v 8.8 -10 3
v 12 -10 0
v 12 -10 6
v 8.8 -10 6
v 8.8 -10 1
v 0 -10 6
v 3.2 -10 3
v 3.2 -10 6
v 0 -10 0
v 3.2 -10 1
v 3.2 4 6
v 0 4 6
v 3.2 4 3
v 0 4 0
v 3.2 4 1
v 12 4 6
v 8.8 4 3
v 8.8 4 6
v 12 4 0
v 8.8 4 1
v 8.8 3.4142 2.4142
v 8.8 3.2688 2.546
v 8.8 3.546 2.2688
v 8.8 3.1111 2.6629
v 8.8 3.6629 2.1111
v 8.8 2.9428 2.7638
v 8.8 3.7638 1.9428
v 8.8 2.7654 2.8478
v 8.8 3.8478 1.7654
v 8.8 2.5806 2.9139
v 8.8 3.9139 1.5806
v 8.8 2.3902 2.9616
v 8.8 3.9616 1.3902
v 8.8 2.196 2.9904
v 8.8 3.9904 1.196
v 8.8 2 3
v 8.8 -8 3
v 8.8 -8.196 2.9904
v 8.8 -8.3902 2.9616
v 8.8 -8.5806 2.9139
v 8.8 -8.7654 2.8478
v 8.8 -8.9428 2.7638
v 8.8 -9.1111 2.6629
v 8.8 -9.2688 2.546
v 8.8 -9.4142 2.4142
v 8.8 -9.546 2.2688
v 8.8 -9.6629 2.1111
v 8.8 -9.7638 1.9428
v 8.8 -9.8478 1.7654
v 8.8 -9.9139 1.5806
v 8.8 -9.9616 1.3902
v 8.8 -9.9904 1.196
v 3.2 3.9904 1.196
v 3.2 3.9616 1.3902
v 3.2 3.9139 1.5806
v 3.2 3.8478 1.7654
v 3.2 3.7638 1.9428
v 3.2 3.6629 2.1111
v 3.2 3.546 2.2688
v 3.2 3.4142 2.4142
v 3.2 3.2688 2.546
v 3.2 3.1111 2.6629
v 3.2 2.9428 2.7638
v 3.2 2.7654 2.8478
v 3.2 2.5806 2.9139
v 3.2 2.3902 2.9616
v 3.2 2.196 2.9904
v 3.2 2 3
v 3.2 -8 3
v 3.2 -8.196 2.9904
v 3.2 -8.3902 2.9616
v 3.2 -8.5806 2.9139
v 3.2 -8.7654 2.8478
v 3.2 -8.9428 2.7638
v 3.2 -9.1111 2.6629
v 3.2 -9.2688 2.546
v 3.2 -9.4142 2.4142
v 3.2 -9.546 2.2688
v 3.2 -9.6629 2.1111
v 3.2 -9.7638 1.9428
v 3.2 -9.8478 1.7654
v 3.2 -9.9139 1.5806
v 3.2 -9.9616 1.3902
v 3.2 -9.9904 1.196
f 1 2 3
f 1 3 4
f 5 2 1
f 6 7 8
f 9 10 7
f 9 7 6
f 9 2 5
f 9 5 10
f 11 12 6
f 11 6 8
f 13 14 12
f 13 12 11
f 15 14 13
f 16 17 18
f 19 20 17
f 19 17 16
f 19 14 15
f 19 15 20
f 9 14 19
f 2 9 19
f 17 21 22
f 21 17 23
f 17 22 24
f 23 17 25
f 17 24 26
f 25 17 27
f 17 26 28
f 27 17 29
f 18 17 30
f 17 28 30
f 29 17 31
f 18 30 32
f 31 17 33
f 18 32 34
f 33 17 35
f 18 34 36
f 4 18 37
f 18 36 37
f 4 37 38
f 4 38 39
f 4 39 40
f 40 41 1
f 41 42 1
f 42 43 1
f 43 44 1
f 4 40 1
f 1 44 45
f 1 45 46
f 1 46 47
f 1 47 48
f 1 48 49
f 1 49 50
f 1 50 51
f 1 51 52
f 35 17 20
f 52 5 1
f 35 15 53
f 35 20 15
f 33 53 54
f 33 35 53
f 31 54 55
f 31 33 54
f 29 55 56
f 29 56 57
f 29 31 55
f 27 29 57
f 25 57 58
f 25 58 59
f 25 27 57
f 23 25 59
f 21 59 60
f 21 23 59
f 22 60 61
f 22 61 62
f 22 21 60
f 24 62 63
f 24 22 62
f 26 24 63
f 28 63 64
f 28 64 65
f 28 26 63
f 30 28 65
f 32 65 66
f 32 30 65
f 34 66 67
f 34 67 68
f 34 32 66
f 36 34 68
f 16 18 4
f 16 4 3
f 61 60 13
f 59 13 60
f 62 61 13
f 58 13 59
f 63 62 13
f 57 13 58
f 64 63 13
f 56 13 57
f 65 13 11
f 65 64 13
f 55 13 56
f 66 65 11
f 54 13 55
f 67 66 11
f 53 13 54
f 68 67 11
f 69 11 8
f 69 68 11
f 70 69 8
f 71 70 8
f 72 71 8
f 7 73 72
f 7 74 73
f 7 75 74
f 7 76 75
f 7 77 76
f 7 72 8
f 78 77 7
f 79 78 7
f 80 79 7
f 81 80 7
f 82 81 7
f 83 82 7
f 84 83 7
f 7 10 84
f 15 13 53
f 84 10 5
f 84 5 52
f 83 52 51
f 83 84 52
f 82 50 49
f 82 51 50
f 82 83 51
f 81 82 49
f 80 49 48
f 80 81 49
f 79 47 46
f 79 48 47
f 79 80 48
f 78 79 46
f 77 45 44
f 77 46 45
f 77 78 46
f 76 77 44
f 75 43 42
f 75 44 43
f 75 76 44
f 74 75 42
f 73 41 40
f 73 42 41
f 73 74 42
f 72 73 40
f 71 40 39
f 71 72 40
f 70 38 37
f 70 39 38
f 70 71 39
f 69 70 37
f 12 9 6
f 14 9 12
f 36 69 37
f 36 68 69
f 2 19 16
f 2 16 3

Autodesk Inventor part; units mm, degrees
ref_plane "YZ Plane" through (0, 0, 0) normal (1, 0, 0) x (0, 1, 0)
ref_plane "XZ Plane" through (0, 0, 0) normal (0, 1, 0) x (-1, 0, 0)
ref_plane "XY Plane" through (0, 0, 0) normal (0, 0, 1) x (1, 0, 0)
ref_plane "Work Plane1" through (0, 0, 0) normal (0, 0, 1) x (1, 0, 0)
sketch "Sketch1" plane through (0, 0, 0) normal (0, 0, 1) x (1, 0, 0)
  line L0 (12, 0) -> (12, 4) projected
  line L1 (0, 4) -> (12, 4) projected
  line L2 (0, 0) -> (0, 4) projected
  line L3 (12, 0) -> (12, -10)
  line L4 (12, -10) -> (0, -10)
  line L5 (0, -10) -> (0, 4)
  line L6 (0, 4) -> (12, 4)
  line L7 (12, 4) -> (12, 0)
  dimension "d0" = 10
extrude "Extrusion1" add sketch "Sketch1" along normal blind 3
sketch "Sketch2" plane through (0, 0, 3) normal (0, 0, 1) x (1, 0, 0)
  line L0 (12, -10) -> (12, 4) projected
  line L1 (12, 4) -> (0, 4) projected
  line L2 (0, 4) -> (0, -10) projected
  line L3 (0, -10) -> (12, -10) projected
  line L4 (6, 4) -> (8.8, 4)
  line L5 (6, 4) -> (3.2, 4)
  line L6 (8.8, 4) -> (8.8, -10)
  line L7 (8.8, -10) -> (12, -10)
  line L8 (12, 4) -> (8.8, 4)
  line L9 (3.2, 4) -> (3.2, -10)
  line L10 (3.2, -10) -> (0, -10)
  line L11 (0, -10) -> (0, 4)
  line L12 (0, 4) -> (3.2, 4)
  point P0 (0, 0)
  dimension "d3" = 2.8
  dimension "d4" = 2.8
extrude "Extrusion2" add sketch "Sketch2" along normal blind 3 contours L3 L6 L1 L0 | L3 L2 L1 L9
fillet "Fillet1" radius 2 1 edges at (6, 4, 3)
fillet "Fillet2" radius 2 1 edges at (6, -10, 3)
equation "\"d4\" = d3"
properties part number "commutator_attachement_side_plate"
